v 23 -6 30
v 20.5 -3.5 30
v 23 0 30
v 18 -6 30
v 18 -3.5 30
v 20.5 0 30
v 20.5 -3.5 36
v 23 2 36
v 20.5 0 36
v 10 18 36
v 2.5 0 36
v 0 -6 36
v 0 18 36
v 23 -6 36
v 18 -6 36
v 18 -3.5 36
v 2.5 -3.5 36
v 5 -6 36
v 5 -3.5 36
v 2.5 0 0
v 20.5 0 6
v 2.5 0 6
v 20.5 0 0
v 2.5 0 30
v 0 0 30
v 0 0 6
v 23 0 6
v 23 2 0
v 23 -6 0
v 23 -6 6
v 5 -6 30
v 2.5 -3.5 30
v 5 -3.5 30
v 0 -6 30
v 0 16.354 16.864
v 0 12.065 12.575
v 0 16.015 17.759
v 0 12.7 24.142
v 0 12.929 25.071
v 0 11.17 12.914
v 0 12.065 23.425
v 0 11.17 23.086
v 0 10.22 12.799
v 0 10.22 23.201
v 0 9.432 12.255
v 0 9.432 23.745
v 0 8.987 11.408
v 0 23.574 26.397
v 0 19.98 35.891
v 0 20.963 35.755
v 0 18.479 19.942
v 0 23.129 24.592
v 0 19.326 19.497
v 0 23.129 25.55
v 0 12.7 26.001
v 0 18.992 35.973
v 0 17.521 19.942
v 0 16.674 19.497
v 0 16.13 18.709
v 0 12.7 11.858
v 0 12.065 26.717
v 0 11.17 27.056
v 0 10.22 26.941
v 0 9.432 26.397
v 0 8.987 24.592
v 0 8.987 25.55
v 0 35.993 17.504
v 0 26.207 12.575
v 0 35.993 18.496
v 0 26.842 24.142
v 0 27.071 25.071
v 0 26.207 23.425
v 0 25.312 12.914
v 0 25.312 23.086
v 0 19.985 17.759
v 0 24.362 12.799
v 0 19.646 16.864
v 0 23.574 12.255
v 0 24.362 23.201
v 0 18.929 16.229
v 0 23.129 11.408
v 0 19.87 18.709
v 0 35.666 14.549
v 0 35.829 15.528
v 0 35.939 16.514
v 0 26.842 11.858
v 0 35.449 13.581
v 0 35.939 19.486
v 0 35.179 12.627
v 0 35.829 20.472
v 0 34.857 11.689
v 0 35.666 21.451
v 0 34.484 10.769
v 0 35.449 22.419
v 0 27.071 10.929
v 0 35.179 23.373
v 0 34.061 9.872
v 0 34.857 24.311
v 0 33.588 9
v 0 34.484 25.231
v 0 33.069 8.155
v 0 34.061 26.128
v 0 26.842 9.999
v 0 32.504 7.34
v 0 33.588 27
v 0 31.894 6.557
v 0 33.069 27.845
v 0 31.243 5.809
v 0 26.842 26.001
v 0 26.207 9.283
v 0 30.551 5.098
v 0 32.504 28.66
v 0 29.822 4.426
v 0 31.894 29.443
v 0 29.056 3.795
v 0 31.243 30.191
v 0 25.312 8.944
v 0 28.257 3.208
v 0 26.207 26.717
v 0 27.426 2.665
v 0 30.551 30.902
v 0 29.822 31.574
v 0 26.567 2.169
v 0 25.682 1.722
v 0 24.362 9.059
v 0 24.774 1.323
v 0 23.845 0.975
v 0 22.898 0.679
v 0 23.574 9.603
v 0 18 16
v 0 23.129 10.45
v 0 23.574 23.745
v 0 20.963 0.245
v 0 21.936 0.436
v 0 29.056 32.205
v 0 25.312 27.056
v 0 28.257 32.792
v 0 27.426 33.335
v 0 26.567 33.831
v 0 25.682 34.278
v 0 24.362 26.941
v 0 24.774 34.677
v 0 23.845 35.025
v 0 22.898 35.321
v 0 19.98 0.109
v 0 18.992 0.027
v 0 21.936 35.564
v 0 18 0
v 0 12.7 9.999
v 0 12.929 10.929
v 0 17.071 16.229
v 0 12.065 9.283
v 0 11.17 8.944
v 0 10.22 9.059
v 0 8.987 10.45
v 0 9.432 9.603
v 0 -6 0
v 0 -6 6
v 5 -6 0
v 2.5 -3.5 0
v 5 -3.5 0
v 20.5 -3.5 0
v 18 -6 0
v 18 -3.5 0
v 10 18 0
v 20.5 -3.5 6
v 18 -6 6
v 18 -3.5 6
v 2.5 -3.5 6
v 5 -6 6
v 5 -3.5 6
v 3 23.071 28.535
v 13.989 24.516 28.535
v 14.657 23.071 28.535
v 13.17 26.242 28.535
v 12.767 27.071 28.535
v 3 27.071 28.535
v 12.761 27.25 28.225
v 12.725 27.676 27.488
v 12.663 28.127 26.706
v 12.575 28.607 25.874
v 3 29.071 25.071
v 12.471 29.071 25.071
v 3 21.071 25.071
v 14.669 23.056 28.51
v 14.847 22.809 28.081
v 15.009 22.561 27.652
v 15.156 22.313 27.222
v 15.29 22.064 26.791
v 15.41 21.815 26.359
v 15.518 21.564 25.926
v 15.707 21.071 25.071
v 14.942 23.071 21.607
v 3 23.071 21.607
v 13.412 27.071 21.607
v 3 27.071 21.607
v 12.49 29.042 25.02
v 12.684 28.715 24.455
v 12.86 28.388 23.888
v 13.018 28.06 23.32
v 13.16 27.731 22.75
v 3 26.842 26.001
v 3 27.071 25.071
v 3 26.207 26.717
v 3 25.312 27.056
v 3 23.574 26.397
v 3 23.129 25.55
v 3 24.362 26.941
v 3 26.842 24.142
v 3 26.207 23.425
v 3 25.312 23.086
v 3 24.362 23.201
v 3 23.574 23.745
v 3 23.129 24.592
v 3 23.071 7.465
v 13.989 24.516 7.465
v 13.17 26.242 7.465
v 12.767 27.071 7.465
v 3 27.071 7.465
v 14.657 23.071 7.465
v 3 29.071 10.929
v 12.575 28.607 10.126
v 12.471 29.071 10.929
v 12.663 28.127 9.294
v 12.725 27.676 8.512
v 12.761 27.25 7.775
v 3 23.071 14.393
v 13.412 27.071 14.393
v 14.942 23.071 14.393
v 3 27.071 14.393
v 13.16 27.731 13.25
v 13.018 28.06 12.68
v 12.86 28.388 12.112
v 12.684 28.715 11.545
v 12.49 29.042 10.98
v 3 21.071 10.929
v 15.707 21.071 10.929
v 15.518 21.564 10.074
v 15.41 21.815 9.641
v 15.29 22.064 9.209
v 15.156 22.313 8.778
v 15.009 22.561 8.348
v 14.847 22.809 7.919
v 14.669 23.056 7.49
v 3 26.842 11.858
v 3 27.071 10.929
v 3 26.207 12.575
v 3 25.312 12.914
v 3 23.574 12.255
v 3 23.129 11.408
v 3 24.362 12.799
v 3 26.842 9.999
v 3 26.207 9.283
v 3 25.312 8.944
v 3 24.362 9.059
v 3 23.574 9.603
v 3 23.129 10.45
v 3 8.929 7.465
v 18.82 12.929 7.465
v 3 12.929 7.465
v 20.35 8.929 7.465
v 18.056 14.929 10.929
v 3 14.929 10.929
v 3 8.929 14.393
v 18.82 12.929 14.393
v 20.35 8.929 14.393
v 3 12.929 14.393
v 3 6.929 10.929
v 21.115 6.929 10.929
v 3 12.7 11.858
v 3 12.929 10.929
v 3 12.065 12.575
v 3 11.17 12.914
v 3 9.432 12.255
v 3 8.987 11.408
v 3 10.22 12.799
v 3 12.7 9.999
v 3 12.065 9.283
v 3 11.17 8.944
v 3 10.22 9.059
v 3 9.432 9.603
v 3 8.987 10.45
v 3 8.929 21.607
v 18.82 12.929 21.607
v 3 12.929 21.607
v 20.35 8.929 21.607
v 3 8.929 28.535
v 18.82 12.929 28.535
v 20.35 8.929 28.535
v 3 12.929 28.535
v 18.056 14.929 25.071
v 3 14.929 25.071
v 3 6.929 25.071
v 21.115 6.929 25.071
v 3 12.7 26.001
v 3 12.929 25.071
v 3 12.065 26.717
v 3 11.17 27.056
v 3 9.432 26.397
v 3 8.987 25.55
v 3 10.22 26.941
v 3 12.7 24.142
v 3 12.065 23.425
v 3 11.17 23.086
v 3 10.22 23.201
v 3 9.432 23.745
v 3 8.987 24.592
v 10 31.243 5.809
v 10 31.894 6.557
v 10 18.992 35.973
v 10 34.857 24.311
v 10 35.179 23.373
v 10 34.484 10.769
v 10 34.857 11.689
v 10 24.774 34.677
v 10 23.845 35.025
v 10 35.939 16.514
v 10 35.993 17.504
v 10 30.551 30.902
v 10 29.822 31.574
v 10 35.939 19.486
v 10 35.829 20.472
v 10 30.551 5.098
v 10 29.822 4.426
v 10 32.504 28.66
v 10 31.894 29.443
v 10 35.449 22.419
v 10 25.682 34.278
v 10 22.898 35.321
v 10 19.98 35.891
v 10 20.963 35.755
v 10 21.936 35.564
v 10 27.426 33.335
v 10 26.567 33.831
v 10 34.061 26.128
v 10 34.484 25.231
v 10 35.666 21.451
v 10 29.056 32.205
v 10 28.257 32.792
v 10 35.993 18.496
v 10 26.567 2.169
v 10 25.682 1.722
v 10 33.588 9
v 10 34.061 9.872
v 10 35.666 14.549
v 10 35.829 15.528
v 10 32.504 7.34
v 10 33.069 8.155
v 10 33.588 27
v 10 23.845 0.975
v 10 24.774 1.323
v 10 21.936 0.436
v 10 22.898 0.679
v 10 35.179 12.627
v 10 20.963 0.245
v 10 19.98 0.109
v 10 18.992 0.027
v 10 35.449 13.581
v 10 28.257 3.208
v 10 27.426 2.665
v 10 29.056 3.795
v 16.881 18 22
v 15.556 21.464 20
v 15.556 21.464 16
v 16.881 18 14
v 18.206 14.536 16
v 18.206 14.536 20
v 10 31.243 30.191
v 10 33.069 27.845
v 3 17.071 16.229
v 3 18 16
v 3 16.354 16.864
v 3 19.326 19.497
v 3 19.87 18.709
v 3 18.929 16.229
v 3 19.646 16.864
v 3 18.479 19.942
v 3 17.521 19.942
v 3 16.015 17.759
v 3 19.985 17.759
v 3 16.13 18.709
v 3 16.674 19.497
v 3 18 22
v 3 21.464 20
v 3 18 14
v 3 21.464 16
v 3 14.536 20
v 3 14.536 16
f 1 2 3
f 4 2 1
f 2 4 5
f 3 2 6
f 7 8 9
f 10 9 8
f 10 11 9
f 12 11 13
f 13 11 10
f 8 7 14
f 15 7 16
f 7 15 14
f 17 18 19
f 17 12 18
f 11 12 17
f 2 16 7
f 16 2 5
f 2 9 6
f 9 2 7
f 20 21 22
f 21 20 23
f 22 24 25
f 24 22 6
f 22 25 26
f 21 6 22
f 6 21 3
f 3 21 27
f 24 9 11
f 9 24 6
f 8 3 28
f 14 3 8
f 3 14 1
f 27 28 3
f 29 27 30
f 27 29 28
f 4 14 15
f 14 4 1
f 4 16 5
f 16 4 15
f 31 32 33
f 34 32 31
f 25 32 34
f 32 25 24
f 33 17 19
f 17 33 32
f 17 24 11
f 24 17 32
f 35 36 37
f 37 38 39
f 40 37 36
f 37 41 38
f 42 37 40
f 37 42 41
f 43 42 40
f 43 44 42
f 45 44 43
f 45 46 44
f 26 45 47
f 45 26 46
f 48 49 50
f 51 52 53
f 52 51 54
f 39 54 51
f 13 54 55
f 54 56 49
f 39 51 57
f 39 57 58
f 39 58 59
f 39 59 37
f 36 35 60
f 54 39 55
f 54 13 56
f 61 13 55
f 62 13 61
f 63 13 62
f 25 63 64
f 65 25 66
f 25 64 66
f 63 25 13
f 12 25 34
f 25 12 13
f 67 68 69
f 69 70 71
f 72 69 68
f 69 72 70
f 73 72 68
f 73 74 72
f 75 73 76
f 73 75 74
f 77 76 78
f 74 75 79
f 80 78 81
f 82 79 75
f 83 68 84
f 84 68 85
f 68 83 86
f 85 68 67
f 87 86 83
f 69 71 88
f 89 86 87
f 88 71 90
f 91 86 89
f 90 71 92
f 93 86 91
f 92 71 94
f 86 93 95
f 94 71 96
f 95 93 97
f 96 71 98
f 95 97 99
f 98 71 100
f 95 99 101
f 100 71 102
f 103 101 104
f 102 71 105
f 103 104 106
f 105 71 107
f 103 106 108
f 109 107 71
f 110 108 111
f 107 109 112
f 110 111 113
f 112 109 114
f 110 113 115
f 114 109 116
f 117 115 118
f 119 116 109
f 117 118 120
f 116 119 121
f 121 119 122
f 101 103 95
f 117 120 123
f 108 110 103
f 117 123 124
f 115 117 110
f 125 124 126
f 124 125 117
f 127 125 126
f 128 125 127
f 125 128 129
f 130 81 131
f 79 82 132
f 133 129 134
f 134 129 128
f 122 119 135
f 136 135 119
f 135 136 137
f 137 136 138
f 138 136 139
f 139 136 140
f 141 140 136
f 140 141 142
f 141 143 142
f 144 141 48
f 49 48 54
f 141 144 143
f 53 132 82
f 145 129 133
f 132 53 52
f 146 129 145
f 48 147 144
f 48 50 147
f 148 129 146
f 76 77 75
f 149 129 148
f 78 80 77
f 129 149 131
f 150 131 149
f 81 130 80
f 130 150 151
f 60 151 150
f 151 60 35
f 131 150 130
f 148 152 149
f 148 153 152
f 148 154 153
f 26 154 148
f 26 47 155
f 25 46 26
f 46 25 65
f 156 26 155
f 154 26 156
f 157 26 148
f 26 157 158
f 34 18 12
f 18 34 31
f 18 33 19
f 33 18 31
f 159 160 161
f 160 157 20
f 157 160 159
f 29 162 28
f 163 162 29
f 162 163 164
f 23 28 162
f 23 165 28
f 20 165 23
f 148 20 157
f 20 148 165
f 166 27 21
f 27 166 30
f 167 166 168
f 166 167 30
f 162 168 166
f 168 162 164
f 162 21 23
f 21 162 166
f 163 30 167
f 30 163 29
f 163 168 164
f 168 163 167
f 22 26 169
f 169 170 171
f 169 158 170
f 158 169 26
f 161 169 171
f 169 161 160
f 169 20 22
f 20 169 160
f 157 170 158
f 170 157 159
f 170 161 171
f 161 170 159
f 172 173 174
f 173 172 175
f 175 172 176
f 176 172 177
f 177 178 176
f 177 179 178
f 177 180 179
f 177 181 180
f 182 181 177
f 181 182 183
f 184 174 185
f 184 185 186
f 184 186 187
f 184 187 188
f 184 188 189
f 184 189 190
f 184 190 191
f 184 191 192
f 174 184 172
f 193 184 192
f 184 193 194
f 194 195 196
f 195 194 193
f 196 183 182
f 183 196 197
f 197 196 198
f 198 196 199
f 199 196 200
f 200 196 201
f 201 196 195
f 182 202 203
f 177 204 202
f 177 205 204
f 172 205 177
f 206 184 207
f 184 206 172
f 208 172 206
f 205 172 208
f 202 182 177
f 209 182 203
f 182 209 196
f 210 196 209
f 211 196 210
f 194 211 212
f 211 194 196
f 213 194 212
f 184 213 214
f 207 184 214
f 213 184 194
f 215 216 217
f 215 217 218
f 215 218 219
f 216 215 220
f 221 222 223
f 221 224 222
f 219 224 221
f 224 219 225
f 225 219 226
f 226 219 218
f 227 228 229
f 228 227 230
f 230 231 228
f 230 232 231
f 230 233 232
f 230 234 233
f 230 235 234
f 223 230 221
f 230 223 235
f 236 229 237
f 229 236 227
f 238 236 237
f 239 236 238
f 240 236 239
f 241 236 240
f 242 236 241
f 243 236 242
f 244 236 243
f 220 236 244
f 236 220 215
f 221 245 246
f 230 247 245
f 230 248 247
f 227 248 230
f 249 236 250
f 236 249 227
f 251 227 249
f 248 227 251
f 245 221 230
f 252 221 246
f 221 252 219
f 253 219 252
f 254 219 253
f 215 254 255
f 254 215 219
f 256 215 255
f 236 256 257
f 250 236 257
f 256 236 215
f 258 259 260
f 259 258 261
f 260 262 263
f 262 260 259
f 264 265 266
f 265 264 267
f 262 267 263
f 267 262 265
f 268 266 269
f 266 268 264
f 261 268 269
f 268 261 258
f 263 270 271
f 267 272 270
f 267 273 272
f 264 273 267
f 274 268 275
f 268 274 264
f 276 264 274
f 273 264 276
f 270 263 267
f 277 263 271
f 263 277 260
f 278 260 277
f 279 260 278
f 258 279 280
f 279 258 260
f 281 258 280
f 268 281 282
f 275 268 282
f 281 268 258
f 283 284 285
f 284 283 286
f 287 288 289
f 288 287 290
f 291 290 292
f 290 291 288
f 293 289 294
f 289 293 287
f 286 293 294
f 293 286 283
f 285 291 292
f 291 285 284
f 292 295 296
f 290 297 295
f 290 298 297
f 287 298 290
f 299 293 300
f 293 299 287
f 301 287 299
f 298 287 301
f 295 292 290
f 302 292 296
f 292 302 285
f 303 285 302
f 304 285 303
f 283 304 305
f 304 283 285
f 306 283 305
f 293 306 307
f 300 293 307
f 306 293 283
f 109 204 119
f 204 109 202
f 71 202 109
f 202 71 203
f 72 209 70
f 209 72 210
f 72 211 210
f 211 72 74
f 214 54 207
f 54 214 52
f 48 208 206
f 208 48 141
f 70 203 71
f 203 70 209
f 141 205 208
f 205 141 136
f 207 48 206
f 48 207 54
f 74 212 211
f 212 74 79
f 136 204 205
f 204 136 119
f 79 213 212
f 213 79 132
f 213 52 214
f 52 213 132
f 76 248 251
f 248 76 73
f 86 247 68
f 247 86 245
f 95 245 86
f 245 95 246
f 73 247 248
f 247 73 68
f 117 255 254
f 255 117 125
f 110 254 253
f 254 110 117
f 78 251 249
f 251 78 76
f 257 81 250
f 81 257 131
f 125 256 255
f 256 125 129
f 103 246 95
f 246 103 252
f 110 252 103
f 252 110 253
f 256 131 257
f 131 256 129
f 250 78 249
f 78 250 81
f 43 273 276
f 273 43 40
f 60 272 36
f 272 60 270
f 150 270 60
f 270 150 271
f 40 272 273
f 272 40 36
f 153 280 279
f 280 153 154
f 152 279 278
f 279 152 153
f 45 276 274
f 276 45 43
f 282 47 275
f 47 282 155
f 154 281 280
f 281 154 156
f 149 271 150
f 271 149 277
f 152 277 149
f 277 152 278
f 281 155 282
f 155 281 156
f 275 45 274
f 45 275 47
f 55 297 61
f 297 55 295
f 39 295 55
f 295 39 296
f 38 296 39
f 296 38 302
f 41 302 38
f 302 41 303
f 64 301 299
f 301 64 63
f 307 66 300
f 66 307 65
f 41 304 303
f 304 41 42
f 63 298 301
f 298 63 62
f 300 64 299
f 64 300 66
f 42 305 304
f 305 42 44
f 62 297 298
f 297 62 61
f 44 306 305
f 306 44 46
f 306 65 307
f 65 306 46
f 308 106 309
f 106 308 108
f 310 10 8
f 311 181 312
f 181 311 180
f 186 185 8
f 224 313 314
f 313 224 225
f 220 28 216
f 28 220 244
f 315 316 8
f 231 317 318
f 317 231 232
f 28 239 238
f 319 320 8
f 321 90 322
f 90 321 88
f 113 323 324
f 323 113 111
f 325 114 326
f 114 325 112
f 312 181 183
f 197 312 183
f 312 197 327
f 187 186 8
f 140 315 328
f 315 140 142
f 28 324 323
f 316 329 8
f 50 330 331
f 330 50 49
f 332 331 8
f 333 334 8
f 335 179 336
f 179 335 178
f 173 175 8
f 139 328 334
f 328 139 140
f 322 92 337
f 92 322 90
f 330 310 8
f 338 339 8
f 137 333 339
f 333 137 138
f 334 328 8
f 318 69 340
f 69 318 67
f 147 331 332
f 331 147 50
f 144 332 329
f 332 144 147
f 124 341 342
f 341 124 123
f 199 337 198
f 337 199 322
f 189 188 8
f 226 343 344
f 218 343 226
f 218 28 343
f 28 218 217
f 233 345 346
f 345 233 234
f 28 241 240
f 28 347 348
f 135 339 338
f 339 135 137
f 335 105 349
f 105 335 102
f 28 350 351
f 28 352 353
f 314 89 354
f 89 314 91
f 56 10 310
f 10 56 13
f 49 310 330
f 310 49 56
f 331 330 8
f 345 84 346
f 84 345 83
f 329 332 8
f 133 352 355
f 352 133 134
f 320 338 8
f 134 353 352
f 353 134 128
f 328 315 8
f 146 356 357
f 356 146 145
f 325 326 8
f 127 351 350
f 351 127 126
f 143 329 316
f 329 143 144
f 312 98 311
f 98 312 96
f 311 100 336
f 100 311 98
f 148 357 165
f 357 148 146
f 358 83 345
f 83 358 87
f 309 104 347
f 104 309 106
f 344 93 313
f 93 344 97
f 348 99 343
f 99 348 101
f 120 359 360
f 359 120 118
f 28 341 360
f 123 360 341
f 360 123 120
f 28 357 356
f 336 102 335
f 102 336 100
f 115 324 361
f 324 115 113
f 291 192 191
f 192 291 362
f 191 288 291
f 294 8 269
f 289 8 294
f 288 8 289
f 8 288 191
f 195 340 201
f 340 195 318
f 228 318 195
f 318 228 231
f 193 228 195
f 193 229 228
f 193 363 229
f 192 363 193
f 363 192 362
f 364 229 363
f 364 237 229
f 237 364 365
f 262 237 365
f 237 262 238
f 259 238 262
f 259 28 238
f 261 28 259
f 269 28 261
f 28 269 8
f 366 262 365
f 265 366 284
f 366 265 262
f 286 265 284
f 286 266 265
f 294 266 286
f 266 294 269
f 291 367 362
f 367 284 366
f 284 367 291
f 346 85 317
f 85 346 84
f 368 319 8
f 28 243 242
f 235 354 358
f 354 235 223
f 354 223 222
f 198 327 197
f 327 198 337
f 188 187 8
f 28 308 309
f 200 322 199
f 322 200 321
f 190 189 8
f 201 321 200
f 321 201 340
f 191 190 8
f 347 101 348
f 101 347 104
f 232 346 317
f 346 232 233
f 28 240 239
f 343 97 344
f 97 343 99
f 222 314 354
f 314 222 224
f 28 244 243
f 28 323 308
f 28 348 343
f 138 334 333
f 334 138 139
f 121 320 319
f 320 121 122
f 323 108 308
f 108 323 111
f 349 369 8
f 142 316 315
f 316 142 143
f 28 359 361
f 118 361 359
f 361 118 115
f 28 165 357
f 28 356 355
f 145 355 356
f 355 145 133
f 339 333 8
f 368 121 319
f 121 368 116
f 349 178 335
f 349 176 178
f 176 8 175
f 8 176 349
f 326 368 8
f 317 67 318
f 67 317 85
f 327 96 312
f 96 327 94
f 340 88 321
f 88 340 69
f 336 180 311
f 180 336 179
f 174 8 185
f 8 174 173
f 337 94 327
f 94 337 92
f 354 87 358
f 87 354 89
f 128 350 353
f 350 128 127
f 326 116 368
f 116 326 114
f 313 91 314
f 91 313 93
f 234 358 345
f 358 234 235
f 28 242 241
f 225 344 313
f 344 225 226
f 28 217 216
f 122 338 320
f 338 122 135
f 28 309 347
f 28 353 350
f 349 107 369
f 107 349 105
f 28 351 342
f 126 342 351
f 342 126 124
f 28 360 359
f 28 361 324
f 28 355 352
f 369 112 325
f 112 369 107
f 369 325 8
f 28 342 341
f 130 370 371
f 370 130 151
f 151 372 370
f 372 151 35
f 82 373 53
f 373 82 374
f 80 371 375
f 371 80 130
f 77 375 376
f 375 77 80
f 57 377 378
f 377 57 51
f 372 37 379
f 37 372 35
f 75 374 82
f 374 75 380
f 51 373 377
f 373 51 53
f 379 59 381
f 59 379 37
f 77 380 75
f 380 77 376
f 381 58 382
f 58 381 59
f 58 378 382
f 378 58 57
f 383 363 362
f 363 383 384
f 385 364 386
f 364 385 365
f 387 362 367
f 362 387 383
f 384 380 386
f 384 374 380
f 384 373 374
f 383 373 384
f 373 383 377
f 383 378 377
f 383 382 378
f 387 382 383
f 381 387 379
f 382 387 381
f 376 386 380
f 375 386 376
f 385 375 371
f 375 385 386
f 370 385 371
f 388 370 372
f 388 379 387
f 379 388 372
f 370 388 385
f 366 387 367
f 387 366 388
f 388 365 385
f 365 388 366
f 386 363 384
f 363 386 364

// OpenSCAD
//mount for the cheap car composite-video dispay
//Project: camera rig
//sorry, it's not parametric, because I don't see a sensible way of parameterizing those clips

$fs=1/1;
$fa=1/1;
bissl=1/100;
module single_clip() {
  linear_extrude(6) union() {
    square([5,2.5]);
    square([2.5,6]);
  }
}
module quad_clip() {
  translate([23,-6,30])mirror([1,0,0])single_clip();
  translate([0,-6,30])mirror([0,0,0])single_clip();
  translate([23,-6,0])mirror([1,0,0])single_clip();
  translate([0,-6,0])mirror([0,0,0])single_clip();
}
quad_clip();
difference() {
  hull() {
    cube([23,2,36]);
    translate([0,18,18])rotate([0,90,0])cylinder(d=36,h=10);
  }
 // translate([2,18,18])rotate([0,90,0])cylinder(d=12,h=20,$fn=6);
  translate([-bissl,18,18])rotate([0,90,0])cylinder(d=4,h=10);
  translate([3,18,18])rotate([0,90,0])cylinder(d=8,h=20,$fn=6);
  for (a=[45:90:360]) translate([3,18+sin(a)*10,18+cos(a)*10])rotate([90,0,90]) cylinder(d=8,h=20,$fn=6);
  for (a=[45:90:360]) translate([-bissl,18+sin(a)*10,18+cos(a)*10])rotate([90,0,90]) cylinder(d=4,h=10);
}
